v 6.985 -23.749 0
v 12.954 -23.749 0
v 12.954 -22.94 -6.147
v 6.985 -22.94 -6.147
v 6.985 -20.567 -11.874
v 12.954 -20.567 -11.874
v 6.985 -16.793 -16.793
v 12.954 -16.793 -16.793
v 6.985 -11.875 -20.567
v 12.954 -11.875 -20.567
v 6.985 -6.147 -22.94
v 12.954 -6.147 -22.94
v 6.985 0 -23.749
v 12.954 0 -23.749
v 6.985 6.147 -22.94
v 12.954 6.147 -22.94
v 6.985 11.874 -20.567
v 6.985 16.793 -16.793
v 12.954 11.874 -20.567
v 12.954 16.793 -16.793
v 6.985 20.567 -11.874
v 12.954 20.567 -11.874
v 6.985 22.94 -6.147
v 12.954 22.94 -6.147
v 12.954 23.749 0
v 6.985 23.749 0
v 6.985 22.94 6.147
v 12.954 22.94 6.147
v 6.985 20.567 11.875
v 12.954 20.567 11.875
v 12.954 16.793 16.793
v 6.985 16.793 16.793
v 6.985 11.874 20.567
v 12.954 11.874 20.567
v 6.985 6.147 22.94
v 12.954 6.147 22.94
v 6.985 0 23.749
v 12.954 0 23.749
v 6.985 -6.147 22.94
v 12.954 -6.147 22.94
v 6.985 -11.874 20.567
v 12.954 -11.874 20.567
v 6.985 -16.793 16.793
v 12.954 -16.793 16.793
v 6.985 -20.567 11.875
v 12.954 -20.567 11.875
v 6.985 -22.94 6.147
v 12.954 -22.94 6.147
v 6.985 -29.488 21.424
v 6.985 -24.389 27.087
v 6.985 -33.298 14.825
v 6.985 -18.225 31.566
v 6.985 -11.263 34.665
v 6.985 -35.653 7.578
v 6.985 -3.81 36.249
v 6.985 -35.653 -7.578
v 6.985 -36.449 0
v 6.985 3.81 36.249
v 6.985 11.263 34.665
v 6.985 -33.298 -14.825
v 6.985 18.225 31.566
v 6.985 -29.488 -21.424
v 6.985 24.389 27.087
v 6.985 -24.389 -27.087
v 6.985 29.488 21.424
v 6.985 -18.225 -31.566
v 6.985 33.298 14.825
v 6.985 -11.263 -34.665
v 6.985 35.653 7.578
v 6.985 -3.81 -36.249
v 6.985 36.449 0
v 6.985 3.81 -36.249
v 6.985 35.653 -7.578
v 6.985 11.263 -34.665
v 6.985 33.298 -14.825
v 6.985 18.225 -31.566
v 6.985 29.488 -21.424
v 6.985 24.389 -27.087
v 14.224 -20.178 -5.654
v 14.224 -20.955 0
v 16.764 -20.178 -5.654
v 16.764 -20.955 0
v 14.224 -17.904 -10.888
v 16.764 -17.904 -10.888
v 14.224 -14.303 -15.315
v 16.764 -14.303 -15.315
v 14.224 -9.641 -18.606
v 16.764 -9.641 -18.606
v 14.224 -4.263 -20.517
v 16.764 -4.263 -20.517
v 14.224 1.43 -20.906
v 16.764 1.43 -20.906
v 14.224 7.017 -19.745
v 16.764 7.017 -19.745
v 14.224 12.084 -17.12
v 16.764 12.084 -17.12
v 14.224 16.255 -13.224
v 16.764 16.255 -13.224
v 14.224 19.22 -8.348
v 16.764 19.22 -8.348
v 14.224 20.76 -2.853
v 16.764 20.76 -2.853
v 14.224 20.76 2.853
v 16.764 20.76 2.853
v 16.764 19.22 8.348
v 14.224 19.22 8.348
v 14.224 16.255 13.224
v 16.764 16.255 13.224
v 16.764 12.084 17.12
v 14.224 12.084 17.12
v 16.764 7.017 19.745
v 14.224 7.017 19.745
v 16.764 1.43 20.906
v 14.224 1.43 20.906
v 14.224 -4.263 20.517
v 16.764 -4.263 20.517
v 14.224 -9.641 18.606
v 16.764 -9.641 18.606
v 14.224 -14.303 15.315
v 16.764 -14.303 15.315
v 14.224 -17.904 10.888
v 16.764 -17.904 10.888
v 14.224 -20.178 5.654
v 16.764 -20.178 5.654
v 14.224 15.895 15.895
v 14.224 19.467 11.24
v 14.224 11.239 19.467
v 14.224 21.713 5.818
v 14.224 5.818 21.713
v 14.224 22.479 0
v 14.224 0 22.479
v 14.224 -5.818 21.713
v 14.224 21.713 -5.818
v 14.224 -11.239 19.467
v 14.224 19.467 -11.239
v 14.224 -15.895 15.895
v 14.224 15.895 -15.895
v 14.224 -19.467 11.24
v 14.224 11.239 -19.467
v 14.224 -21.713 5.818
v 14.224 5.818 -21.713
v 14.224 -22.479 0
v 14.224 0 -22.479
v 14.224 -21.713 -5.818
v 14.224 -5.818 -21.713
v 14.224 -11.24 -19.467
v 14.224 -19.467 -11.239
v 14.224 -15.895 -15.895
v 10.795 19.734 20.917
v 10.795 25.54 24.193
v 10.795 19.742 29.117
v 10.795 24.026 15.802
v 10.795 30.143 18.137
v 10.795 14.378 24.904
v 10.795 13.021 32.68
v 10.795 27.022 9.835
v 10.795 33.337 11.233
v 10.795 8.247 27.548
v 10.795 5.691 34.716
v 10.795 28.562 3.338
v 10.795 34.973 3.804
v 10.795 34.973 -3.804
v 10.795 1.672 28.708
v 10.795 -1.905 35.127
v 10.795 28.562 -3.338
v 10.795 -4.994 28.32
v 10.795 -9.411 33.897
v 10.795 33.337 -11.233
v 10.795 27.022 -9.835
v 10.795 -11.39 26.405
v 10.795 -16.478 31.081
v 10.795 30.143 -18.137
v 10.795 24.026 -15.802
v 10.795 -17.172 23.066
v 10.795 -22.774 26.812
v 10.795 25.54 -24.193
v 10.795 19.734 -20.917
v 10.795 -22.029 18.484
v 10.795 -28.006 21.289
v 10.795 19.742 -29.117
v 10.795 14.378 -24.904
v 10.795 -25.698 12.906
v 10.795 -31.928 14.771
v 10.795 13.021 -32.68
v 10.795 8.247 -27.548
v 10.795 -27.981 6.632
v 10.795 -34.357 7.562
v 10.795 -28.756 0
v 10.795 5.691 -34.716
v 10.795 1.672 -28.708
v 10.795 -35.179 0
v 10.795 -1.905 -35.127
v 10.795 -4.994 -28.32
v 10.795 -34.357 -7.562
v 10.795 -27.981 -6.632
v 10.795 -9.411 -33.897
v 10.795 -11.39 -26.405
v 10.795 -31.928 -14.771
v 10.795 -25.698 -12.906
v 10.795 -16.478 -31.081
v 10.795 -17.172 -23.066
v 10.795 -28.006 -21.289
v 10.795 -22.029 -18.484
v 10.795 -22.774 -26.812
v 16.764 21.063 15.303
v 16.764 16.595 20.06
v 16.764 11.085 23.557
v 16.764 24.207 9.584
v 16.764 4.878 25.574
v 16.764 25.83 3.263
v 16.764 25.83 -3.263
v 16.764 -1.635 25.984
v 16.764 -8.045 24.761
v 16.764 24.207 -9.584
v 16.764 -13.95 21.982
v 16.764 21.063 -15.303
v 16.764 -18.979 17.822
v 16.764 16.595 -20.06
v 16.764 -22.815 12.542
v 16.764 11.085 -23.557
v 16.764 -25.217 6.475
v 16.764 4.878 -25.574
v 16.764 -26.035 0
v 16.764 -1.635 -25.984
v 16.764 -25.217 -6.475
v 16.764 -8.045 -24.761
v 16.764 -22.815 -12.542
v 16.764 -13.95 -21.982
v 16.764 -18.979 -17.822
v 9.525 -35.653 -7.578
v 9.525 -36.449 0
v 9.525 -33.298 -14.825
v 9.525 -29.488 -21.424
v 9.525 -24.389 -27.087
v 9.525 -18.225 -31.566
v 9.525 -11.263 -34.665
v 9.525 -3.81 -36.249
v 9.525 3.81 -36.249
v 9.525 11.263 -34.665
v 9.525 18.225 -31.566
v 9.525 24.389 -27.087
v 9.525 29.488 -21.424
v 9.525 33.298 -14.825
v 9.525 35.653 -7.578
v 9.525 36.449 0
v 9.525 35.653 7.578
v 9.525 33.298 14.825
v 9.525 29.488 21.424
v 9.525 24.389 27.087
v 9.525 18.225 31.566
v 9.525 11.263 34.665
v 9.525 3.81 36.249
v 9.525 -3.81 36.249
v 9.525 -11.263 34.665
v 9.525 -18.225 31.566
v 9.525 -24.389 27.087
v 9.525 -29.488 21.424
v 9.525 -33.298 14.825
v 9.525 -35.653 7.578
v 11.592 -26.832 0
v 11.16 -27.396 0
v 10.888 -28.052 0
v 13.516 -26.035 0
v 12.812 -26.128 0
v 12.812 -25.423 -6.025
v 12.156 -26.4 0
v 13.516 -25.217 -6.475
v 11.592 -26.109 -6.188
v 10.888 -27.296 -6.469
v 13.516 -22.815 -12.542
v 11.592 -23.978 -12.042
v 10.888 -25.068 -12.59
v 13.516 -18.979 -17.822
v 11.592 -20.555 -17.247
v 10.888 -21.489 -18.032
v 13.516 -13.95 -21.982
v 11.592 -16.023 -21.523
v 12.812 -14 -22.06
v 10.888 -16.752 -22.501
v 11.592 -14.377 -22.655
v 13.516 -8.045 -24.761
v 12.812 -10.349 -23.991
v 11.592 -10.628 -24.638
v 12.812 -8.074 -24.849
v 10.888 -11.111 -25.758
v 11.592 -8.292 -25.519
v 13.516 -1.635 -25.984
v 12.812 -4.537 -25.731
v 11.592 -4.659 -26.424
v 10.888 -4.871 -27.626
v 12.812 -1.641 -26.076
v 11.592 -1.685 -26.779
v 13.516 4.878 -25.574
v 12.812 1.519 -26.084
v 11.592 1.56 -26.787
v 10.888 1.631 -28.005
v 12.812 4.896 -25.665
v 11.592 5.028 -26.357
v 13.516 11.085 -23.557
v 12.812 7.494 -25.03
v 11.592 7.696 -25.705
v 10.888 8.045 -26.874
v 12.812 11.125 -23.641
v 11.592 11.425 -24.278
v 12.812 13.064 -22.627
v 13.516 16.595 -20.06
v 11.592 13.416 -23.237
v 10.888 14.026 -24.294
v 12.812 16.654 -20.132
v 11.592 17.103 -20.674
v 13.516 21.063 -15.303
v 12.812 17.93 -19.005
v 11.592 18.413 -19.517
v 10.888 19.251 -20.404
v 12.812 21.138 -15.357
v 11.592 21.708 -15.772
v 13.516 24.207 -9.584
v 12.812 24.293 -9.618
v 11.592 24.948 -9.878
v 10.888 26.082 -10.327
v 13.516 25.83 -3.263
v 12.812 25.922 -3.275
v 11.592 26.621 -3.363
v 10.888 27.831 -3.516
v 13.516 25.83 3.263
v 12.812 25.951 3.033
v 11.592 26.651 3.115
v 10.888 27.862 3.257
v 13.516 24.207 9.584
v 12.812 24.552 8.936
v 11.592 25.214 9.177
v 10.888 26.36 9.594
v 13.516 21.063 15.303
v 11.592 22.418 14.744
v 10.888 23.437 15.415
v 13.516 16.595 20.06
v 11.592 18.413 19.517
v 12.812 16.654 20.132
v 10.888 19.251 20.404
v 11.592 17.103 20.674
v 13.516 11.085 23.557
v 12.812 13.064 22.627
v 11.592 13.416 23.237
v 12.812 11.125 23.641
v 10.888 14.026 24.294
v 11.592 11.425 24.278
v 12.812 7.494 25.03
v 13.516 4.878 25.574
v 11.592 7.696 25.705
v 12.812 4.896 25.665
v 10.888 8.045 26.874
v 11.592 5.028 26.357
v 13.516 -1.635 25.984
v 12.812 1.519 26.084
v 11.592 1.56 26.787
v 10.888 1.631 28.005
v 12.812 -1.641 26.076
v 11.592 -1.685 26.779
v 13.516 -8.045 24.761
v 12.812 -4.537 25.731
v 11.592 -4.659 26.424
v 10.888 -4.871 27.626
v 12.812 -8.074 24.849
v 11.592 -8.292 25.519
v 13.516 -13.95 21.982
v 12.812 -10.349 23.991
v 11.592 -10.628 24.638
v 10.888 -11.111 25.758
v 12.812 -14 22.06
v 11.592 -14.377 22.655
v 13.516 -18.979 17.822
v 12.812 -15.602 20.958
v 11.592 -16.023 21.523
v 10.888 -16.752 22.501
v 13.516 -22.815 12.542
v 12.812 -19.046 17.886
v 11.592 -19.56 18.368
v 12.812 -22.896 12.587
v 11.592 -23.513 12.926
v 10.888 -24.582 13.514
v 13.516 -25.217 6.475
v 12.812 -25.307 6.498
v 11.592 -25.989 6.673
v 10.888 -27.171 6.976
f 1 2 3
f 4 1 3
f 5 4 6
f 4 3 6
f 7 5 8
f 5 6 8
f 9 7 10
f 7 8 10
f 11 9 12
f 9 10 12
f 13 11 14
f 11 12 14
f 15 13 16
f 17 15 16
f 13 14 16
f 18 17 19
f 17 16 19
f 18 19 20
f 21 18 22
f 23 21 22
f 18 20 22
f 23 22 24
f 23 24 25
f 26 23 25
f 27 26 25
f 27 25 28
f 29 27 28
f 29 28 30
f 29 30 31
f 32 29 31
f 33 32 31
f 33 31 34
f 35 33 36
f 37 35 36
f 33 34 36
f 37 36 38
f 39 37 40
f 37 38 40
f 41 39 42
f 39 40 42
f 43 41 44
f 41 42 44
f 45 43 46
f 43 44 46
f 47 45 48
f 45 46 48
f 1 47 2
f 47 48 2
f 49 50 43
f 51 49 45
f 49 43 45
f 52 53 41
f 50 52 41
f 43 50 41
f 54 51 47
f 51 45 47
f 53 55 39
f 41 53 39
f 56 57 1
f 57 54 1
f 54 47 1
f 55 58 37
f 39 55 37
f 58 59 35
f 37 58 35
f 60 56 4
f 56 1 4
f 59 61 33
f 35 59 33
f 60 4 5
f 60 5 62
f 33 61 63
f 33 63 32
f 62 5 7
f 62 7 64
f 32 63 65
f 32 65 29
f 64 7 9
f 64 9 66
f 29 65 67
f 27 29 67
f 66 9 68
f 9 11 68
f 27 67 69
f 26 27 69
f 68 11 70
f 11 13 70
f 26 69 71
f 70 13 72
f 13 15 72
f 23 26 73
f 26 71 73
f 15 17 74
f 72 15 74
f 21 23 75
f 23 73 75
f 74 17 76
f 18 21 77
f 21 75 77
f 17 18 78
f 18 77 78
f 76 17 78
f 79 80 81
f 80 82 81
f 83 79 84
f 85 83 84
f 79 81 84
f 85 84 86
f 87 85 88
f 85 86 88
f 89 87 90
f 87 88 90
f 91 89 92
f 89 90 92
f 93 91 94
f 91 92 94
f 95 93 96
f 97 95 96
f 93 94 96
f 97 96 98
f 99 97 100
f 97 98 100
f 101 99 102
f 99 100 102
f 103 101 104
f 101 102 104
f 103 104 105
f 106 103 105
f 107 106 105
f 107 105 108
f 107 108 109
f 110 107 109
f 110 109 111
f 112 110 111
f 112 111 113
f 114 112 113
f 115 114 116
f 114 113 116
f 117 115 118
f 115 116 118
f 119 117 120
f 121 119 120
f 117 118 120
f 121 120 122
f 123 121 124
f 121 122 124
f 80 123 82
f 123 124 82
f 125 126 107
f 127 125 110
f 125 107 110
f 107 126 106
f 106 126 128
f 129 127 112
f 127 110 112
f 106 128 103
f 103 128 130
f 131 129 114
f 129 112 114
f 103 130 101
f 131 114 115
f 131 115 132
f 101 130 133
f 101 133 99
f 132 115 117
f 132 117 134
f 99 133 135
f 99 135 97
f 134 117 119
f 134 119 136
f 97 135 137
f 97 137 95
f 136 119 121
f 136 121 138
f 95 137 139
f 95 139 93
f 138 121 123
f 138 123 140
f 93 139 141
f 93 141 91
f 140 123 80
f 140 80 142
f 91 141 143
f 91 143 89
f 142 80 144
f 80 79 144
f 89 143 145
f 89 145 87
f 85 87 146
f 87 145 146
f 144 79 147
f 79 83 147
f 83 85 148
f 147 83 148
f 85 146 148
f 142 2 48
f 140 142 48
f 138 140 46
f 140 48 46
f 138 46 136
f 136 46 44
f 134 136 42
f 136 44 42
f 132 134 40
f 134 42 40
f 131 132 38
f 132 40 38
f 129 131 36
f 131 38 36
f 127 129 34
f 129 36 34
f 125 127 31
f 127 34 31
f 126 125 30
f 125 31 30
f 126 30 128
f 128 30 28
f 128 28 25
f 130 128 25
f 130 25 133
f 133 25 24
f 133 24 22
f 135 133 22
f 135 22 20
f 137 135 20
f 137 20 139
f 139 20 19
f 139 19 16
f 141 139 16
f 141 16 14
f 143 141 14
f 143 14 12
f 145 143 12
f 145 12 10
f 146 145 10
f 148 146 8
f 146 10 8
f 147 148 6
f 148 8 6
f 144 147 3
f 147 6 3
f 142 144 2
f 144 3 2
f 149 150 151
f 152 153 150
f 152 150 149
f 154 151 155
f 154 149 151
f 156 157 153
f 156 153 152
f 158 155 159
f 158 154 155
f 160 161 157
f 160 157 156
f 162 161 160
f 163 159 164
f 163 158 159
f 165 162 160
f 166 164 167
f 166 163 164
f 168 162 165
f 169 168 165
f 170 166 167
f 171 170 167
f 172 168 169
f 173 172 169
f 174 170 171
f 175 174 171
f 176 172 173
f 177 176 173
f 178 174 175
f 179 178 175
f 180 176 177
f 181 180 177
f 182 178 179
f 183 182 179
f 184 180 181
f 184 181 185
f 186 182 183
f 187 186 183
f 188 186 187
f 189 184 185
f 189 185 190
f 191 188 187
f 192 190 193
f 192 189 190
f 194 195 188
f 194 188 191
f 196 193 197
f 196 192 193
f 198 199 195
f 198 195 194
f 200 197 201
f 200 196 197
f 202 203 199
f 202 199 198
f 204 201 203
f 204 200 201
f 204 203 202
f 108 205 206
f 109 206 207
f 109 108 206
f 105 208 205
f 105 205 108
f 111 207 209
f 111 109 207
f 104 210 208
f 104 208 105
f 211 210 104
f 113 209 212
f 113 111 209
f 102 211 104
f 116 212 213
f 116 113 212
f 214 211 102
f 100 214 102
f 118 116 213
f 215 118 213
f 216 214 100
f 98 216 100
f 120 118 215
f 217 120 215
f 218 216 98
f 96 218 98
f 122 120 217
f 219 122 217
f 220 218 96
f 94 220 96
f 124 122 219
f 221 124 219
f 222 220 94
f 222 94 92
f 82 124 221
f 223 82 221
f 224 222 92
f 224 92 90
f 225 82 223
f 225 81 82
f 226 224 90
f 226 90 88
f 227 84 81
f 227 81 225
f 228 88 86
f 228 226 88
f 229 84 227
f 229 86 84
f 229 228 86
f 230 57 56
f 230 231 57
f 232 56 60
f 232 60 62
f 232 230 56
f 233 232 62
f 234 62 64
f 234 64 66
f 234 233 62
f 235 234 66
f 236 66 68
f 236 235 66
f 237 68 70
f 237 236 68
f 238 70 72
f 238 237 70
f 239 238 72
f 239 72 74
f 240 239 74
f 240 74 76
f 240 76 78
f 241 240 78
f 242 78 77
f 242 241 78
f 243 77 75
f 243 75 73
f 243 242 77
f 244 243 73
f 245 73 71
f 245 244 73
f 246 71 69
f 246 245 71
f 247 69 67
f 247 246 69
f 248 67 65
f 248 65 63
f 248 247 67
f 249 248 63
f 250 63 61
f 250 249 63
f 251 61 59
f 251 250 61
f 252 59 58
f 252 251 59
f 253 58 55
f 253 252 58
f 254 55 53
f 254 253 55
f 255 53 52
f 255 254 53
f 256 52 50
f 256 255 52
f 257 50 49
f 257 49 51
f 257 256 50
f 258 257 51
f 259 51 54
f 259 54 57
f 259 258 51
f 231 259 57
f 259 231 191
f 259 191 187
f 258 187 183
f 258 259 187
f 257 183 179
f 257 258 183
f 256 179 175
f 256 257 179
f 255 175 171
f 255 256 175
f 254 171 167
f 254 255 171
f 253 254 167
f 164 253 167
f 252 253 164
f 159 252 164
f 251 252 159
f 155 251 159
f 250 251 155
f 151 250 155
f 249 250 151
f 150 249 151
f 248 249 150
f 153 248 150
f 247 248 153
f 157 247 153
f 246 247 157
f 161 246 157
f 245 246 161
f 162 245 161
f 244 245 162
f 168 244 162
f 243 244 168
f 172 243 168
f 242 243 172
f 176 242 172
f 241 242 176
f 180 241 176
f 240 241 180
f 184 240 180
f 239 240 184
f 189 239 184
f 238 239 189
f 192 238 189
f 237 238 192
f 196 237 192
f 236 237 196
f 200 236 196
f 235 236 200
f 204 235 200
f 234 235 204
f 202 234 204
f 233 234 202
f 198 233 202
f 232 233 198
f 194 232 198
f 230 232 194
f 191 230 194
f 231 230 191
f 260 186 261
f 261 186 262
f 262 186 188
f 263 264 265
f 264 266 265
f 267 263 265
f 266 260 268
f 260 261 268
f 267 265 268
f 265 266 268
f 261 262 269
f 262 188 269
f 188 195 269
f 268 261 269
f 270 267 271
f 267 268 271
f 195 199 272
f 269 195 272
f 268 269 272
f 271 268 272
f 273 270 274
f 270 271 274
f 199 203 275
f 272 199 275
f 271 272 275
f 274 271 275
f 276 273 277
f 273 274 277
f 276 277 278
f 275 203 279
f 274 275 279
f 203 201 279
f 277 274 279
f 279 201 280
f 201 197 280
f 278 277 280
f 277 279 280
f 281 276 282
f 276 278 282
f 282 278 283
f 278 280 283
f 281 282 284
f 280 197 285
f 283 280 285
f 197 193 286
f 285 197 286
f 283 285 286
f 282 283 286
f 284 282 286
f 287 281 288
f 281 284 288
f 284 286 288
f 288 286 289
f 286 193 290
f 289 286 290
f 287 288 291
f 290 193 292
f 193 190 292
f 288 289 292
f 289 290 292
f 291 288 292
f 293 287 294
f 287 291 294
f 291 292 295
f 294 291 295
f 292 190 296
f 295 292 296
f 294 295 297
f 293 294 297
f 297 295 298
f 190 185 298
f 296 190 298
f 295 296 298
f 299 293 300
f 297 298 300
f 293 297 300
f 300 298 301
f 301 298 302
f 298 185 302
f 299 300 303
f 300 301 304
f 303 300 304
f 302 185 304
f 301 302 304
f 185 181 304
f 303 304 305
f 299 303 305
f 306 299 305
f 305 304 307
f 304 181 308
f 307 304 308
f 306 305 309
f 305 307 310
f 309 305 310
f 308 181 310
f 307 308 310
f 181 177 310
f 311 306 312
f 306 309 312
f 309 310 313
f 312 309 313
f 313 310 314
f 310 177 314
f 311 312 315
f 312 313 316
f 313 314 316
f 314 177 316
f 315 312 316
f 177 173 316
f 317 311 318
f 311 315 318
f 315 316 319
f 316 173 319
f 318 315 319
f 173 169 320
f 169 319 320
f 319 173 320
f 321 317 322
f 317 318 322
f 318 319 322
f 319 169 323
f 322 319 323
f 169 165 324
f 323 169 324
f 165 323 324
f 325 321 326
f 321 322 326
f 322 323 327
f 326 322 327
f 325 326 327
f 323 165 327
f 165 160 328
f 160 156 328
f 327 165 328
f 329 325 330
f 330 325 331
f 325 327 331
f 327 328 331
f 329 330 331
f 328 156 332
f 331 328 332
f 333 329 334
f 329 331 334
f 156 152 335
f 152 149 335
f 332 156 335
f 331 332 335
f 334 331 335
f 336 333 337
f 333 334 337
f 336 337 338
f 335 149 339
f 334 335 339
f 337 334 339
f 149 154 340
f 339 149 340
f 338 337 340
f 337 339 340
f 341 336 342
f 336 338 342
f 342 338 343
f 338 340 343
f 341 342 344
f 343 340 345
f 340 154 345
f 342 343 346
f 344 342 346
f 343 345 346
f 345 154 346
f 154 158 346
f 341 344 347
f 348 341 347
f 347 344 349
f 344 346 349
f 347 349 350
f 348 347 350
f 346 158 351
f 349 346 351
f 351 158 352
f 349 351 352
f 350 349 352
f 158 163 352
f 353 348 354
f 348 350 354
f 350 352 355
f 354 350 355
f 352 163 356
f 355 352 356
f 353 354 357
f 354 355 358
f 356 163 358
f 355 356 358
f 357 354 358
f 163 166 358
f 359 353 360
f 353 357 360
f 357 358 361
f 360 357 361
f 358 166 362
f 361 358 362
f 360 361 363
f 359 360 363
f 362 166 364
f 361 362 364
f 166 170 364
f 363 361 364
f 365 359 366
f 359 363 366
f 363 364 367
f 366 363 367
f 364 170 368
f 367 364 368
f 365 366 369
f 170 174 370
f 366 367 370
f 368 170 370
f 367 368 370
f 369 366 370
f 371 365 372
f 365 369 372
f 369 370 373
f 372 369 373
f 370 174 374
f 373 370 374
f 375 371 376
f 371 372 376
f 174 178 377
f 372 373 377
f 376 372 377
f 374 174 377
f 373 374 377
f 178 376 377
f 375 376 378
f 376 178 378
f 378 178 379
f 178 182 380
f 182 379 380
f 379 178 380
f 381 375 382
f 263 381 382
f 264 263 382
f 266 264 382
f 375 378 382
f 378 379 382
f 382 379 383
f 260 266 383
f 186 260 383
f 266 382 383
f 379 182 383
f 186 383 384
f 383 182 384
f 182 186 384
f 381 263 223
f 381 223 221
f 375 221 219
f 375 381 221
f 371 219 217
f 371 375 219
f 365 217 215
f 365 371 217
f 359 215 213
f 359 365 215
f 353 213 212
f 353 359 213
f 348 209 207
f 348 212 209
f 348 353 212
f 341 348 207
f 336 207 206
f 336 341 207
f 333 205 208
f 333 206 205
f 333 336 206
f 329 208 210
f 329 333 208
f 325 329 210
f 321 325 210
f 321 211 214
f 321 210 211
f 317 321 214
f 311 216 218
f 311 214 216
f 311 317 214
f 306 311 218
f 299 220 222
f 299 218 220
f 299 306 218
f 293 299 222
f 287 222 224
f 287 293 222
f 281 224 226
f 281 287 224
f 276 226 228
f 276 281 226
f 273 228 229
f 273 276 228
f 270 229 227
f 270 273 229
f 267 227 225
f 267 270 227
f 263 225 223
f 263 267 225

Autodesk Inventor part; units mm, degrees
ref_plane "YZ Plane" through (0, 0, 0) normal (1, 0, 0) x (0, 1, 0)
ref_plane "XZ Plane" through (0, 0, 0) normal (0, 1, 0) x (-1, 0, 0)
sketch "Sketch1" plane through (0, 0, 0) normal (0, 0, 1) x (1, 0, 0)
  line L0 (0, -23.495) -> (13.97, -23.495)
  line L1 (0, 23.495) -> (0, -23.495) projected
  line L2 (13.97, -23.495) -> (13.97, 23.495) projected
  line L3 (2.54, -27.305) -> (-12.065, -27.305) projected
  line L4 (26.035, -27.305) -> (11.43, -27.305) projected
  line L5 (2.54, -31.115) -> (2.54, -27.305) projected
  line L6 (11.43, -27.305) -> (11.43, -31.115) projected
  line L7 (0, -31.115) -> (2.54, -31.115) projected
  line L8 (11.43, -31.115) -> (13.97, -31.115) projected
  line L9 (3.175, -36.449) -> (10.795, -36.449)
  line L10 (10.795, -36.449) -> (10.795, -28.7565)
  line L11 (3.175, -36.449) -> (3.175, -28.7565)
  line L12 (-2.794, -26.035) -> (0.4535, -26.035)
  line L13 (-0.254, -23.749) -> (14.224, -23.749)
  line L14 (14.224, -23.749) -> (14.224, -20.955)
  line L15 (14.224, -20.955) -> (16.764, -20.955)
  line L16 (16.764, -20.955) -> (16.764, -26.035)
  line L17 (16.764, -26.035) -> (13.5165, -26.035)
  arc A0 (3.175, -28.7565) -> (0.4535, -26.035) centre (0.4535, -28.7565) ccw
  arc A1 (13.5165, -26.035) -> (10.795, -28.7565) centre (13.5165, -28.7565) ccw
  line L18 (-19.685, 0) -> (33.655, 0) projected
  line L19 (-2.794, -26.035) -> (-2.794, -20.955)
  line L20 (-2.794, -20.955) -> (-0.254, -20.955)
  line L21 (-0.254, -20.955) -> (-0.254, -23.749)
  point P0 (0, 0)
  dimension "d0" = 0.635
  dimension "d1" = 0.635
  dimension "d2" = 7.62
  dimension "d3" = 0.254
  dimension "d4" = 0.254
  dimension "d5" = 2.54
  dimension "d6" = 2.54
  dimension "d7" = 1.27
  dimension "d9" = 12.7
  dimension "d10" = 2.5418
revolve "Revolution1" add sketch "Sketch1" angle 360 about axis through (-10, 0, 0) along (1, 0, 0) contours L11 A0 L12 L19 L20 L21 L13 L14 L15 L16 L17 A1 L10 L9
chamfer "Chamfer1" distance 1.27 angle 45 2 edges at (10.795, 36.449, 0) (3.175, 36.449, 0)
ref_plane "Work Plane1" through (6.985, 0, 0) normal (1, 0, 0) x (0, 0, -1)
sketch "Sketch2" plane through (6.985, 0, 0) normal (1, 0, 0) x (0, 0, -1)
  line L0 (58.906, -57.765) -> (-58.906, -57.765)
  line L1 (-58.906, -57.765) -> (-58.906, 57.765)
  line L2 (-58.906, 57.765) -> (58.906, 57.765)
  line L3 (58.906, 57.765) -> (58.906, -57.765)
  line L4 (58.906, -57.765) -> (-58.906, 57.765) construction
  line L5 (-58.906, -57.765) -> (58.906, 57.765) construction
  point P0 (0, 0)
extrude "Extrusion1" cut sketch "Sketch2" against normal through all
chamfer "Chamfer2" distance 1.27 angle 45 1 edges at (14.224, 23.749, 0)
equation "\"d1\" = d0"
equation "\"d4\" = d3"
properties part number "Big Bearing Cover"
